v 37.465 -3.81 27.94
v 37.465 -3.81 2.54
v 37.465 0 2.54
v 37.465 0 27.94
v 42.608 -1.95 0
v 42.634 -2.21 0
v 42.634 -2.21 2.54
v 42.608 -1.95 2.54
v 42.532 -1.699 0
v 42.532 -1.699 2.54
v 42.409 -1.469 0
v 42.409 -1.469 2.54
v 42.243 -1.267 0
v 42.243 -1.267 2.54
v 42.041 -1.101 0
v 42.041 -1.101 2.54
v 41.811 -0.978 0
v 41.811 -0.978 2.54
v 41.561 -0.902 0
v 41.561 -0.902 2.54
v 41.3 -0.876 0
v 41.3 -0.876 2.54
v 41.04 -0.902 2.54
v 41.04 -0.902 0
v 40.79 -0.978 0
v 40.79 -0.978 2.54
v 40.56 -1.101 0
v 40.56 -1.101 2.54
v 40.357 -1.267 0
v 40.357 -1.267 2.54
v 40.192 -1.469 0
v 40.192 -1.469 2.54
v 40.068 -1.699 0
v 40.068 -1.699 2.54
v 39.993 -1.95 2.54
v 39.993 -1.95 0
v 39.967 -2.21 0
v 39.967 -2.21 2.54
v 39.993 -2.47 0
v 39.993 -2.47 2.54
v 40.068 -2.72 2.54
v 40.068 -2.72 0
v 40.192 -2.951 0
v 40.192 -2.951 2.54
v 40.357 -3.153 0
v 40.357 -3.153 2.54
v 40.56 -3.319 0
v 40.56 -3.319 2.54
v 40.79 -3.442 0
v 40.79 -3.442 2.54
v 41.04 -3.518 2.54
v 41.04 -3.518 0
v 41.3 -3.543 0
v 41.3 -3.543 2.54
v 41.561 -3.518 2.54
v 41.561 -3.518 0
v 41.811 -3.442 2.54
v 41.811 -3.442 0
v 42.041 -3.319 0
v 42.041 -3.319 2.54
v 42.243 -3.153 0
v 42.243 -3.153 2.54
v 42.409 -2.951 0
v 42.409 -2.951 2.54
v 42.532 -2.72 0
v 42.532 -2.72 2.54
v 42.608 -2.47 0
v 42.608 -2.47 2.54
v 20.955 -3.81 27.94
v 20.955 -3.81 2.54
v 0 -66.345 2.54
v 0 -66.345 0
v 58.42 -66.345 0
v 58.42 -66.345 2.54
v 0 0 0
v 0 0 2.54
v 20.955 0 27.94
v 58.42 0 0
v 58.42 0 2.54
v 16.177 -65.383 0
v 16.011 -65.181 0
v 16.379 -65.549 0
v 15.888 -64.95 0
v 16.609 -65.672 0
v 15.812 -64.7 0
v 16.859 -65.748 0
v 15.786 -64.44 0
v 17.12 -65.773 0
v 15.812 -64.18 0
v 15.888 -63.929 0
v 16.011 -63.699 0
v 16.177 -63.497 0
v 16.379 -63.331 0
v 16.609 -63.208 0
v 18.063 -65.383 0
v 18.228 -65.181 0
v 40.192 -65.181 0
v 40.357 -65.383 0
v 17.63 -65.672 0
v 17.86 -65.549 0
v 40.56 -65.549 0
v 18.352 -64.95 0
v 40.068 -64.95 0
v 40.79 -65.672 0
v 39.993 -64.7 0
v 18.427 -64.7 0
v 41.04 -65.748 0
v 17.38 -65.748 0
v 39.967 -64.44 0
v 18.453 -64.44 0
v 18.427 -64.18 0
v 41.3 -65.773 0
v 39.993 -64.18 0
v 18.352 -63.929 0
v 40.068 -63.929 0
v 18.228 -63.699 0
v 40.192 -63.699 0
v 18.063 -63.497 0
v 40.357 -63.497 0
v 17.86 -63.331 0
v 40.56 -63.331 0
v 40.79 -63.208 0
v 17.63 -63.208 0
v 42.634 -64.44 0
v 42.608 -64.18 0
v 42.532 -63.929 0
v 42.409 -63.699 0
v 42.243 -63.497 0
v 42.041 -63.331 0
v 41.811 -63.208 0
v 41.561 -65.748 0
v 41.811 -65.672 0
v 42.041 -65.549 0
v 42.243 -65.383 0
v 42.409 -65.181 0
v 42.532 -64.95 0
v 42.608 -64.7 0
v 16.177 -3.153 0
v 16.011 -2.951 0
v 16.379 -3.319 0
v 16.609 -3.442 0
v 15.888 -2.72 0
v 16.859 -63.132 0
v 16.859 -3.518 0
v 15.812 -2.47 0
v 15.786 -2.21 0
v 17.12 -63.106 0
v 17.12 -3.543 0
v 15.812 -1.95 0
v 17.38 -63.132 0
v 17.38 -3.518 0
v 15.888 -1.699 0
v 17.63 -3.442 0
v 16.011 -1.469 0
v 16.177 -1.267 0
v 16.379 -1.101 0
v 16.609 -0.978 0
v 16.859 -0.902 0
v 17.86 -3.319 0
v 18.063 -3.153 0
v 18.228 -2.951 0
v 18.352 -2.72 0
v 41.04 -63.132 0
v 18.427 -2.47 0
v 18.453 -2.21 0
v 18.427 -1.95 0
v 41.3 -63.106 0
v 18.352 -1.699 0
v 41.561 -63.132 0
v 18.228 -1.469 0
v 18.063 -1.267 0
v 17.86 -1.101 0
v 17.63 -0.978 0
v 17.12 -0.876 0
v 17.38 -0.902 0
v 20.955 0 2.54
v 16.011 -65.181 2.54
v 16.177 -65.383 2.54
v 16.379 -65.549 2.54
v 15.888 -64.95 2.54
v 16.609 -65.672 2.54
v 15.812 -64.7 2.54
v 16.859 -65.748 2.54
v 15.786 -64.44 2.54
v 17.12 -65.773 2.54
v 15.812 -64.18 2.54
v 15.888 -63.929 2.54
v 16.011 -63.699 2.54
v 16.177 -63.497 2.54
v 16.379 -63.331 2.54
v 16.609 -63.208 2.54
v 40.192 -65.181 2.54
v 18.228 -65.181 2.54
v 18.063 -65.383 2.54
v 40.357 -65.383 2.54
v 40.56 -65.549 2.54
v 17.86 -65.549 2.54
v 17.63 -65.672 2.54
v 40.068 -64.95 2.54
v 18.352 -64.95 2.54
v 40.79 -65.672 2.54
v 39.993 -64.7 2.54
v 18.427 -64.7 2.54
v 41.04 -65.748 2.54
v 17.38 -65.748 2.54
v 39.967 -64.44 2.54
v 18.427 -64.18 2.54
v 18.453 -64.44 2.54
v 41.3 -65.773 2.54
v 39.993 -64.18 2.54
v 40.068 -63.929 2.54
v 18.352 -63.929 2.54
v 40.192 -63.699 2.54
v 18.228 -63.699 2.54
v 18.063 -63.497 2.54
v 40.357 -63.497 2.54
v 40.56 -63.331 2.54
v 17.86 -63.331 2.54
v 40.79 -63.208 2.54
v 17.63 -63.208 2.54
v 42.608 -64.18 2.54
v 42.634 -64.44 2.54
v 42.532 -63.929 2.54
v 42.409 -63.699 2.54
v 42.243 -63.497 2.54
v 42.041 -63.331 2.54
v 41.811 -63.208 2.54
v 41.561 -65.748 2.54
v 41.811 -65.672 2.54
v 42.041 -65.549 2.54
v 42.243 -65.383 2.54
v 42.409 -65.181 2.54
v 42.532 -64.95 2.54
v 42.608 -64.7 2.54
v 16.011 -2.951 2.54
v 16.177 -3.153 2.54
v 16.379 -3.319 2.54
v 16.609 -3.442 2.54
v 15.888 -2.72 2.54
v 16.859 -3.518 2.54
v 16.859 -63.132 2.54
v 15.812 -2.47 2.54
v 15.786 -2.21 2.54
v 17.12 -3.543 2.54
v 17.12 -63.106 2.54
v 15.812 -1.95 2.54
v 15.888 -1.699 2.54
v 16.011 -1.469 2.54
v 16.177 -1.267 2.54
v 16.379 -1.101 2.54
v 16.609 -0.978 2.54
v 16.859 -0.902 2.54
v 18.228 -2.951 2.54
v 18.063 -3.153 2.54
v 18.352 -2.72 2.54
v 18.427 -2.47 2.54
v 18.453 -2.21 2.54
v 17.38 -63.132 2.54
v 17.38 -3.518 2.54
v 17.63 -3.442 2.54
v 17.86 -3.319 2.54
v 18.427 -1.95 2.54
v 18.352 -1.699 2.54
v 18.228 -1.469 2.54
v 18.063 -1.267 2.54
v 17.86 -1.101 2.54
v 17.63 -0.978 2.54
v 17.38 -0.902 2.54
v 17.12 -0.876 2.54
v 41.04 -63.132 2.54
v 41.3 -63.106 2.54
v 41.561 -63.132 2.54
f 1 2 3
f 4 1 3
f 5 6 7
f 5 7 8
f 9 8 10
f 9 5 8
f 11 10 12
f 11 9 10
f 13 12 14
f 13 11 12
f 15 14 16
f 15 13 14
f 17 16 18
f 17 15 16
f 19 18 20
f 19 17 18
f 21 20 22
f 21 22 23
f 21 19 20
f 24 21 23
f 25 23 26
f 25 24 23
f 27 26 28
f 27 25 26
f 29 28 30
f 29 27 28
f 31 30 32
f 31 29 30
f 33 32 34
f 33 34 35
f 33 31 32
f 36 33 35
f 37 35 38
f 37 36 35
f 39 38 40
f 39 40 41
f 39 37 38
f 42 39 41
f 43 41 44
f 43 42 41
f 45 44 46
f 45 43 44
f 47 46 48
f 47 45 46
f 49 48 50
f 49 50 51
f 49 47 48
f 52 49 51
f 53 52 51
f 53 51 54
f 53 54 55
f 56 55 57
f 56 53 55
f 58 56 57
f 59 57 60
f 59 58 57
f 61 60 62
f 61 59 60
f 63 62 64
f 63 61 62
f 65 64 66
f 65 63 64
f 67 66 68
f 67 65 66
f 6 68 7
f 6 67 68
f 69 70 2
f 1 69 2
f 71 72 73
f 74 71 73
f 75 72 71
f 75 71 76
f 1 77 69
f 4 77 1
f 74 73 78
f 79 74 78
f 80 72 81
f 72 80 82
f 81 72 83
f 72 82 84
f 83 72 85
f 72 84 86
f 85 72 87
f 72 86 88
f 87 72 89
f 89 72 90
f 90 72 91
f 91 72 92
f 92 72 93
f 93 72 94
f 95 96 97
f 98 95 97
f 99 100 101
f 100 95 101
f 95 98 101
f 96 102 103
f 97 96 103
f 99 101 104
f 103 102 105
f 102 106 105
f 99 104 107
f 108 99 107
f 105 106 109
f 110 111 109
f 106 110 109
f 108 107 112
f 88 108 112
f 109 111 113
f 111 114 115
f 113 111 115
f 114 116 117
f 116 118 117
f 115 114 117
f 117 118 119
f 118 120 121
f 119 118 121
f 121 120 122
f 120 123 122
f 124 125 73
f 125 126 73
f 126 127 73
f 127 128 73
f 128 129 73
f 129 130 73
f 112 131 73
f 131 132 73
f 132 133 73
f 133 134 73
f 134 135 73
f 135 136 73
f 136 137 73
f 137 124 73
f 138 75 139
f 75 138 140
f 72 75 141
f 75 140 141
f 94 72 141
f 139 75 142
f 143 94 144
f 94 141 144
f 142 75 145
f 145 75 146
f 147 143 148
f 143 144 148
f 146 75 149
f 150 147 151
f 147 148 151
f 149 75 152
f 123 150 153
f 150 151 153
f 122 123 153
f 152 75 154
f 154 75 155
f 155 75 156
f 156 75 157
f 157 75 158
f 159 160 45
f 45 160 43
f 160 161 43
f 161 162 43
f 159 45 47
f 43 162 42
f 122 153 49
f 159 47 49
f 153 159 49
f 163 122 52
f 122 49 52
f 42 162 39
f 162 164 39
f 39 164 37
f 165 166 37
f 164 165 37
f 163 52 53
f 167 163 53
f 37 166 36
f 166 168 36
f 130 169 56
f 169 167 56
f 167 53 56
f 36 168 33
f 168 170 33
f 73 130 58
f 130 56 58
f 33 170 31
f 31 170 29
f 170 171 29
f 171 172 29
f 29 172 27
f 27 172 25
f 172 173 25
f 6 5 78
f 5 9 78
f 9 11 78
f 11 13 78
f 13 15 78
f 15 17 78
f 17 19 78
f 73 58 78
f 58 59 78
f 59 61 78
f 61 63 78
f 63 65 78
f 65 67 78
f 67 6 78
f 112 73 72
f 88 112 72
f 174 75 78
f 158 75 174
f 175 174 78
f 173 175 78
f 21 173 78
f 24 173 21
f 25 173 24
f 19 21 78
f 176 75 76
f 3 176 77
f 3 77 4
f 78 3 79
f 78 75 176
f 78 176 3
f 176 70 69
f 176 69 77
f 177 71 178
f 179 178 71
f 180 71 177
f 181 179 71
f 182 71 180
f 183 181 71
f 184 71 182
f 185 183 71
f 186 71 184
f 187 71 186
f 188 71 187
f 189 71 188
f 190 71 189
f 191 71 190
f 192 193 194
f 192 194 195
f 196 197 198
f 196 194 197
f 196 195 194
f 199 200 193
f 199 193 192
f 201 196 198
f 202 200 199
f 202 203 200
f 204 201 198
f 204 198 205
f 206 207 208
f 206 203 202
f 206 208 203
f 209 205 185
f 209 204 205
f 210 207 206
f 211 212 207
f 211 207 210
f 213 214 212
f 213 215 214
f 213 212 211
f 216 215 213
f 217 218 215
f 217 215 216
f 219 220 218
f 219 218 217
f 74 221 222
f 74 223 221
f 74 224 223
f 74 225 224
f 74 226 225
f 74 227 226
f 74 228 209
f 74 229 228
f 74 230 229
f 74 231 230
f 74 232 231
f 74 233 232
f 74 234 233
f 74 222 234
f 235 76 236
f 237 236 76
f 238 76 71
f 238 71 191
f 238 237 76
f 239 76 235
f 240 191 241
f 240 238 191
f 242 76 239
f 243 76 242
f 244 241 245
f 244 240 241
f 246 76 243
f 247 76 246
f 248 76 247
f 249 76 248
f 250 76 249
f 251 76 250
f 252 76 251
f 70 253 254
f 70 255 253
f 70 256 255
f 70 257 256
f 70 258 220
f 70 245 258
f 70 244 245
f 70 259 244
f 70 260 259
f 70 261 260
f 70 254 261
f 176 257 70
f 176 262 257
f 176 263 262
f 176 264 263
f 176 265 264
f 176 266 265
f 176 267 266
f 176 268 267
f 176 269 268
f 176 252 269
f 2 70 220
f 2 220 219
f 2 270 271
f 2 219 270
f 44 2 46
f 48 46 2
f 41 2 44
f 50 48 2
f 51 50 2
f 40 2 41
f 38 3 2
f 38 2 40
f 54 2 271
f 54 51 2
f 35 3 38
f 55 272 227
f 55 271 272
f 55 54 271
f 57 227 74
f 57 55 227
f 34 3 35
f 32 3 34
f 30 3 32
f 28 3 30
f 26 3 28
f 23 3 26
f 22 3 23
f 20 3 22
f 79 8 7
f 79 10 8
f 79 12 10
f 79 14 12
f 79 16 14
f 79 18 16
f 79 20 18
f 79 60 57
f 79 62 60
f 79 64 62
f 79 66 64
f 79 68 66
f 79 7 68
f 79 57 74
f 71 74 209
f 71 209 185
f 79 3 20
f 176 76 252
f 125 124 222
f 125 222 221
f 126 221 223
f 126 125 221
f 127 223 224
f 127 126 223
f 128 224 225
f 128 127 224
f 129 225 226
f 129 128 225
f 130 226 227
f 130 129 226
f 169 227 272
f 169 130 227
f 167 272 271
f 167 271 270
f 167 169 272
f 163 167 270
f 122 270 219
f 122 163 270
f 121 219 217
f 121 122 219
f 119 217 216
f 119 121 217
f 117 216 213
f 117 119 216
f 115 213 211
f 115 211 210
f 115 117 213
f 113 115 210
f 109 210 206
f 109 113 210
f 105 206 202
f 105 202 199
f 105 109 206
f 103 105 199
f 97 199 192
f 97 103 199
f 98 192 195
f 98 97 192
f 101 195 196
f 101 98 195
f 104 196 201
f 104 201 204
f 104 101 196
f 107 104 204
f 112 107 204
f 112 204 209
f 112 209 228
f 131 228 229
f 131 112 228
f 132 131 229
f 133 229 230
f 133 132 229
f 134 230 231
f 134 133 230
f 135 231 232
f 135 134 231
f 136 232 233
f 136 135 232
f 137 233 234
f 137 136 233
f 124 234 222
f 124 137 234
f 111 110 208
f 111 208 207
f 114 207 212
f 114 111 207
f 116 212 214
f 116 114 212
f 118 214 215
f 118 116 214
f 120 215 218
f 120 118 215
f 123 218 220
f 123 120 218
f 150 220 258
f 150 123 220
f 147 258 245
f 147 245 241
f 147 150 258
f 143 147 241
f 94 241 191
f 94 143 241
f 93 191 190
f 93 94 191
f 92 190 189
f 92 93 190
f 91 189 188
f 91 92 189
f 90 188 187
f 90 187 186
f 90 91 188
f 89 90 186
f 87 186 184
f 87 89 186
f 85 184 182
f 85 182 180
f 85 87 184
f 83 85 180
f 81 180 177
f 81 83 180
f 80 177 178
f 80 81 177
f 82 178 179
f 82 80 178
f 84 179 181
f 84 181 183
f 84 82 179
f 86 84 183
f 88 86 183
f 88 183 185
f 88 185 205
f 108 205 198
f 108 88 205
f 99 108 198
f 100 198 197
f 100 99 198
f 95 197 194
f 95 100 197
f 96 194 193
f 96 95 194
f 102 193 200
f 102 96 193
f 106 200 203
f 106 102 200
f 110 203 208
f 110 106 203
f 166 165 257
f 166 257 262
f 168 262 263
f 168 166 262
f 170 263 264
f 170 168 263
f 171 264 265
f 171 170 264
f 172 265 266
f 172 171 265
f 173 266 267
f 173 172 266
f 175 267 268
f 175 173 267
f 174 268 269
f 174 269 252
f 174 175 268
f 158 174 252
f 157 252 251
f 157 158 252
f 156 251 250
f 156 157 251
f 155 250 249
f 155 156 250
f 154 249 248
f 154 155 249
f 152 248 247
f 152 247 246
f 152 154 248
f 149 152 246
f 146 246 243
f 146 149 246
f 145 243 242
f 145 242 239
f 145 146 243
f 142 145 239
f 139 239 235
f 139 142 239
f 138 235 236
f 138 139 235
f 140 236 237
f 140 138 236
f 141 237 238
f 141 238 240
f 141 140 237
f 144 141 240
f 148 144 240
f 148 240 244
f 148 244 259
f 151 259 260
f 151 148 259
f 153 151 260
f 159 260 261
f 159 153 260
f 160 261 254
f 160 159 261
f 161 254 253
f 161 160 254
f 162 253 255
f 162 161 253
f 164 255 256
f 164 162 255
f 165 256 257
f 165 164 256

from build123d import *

# Parameters (mm, degrees)
F0_W     = 58.42
F0_H     = 66.3448
F0_R     = 1.3335
F1_DEPTH = 2.54
F2_W     = 16.51
F2_H     = 3.81
F3_DEPTH = 25.4


with BuildPart() as f1:
    # F0 (on Top) → F1 (new body)
    with BuildSketch(Plane.XY):
        with Locations((29.21, -33.1724)):
            Rectangle(F0_W, F0_H)
        with Locations((17.1196, -64.4398)):
            Circle(F0_R, mode=Mode.SUBTRACT)
        with Locations((41.3004, -64.4398)):
            Circle(F0_R, mode=Mode.SUBTRACT)
        with Locations((17.1196, -2.2098)):
            Circle(F0_R, mode=Mode.SUBTRACT)
        with Locations((41.3004, -2.2098)):
            Circle(F0_R, mode=Mode.SUBTRACT)
    extrude(amount=F1_DEPTH)

    # F2 (on face) → F3 (join)
    with BuildSketch(Plane.XY.offset(2.54)):
        with Locations((29.21, -1.905)):
            Rectangle(F2_W, F2_H)
    extrude(amount=F3_DEPTH)


solid = f1.part
